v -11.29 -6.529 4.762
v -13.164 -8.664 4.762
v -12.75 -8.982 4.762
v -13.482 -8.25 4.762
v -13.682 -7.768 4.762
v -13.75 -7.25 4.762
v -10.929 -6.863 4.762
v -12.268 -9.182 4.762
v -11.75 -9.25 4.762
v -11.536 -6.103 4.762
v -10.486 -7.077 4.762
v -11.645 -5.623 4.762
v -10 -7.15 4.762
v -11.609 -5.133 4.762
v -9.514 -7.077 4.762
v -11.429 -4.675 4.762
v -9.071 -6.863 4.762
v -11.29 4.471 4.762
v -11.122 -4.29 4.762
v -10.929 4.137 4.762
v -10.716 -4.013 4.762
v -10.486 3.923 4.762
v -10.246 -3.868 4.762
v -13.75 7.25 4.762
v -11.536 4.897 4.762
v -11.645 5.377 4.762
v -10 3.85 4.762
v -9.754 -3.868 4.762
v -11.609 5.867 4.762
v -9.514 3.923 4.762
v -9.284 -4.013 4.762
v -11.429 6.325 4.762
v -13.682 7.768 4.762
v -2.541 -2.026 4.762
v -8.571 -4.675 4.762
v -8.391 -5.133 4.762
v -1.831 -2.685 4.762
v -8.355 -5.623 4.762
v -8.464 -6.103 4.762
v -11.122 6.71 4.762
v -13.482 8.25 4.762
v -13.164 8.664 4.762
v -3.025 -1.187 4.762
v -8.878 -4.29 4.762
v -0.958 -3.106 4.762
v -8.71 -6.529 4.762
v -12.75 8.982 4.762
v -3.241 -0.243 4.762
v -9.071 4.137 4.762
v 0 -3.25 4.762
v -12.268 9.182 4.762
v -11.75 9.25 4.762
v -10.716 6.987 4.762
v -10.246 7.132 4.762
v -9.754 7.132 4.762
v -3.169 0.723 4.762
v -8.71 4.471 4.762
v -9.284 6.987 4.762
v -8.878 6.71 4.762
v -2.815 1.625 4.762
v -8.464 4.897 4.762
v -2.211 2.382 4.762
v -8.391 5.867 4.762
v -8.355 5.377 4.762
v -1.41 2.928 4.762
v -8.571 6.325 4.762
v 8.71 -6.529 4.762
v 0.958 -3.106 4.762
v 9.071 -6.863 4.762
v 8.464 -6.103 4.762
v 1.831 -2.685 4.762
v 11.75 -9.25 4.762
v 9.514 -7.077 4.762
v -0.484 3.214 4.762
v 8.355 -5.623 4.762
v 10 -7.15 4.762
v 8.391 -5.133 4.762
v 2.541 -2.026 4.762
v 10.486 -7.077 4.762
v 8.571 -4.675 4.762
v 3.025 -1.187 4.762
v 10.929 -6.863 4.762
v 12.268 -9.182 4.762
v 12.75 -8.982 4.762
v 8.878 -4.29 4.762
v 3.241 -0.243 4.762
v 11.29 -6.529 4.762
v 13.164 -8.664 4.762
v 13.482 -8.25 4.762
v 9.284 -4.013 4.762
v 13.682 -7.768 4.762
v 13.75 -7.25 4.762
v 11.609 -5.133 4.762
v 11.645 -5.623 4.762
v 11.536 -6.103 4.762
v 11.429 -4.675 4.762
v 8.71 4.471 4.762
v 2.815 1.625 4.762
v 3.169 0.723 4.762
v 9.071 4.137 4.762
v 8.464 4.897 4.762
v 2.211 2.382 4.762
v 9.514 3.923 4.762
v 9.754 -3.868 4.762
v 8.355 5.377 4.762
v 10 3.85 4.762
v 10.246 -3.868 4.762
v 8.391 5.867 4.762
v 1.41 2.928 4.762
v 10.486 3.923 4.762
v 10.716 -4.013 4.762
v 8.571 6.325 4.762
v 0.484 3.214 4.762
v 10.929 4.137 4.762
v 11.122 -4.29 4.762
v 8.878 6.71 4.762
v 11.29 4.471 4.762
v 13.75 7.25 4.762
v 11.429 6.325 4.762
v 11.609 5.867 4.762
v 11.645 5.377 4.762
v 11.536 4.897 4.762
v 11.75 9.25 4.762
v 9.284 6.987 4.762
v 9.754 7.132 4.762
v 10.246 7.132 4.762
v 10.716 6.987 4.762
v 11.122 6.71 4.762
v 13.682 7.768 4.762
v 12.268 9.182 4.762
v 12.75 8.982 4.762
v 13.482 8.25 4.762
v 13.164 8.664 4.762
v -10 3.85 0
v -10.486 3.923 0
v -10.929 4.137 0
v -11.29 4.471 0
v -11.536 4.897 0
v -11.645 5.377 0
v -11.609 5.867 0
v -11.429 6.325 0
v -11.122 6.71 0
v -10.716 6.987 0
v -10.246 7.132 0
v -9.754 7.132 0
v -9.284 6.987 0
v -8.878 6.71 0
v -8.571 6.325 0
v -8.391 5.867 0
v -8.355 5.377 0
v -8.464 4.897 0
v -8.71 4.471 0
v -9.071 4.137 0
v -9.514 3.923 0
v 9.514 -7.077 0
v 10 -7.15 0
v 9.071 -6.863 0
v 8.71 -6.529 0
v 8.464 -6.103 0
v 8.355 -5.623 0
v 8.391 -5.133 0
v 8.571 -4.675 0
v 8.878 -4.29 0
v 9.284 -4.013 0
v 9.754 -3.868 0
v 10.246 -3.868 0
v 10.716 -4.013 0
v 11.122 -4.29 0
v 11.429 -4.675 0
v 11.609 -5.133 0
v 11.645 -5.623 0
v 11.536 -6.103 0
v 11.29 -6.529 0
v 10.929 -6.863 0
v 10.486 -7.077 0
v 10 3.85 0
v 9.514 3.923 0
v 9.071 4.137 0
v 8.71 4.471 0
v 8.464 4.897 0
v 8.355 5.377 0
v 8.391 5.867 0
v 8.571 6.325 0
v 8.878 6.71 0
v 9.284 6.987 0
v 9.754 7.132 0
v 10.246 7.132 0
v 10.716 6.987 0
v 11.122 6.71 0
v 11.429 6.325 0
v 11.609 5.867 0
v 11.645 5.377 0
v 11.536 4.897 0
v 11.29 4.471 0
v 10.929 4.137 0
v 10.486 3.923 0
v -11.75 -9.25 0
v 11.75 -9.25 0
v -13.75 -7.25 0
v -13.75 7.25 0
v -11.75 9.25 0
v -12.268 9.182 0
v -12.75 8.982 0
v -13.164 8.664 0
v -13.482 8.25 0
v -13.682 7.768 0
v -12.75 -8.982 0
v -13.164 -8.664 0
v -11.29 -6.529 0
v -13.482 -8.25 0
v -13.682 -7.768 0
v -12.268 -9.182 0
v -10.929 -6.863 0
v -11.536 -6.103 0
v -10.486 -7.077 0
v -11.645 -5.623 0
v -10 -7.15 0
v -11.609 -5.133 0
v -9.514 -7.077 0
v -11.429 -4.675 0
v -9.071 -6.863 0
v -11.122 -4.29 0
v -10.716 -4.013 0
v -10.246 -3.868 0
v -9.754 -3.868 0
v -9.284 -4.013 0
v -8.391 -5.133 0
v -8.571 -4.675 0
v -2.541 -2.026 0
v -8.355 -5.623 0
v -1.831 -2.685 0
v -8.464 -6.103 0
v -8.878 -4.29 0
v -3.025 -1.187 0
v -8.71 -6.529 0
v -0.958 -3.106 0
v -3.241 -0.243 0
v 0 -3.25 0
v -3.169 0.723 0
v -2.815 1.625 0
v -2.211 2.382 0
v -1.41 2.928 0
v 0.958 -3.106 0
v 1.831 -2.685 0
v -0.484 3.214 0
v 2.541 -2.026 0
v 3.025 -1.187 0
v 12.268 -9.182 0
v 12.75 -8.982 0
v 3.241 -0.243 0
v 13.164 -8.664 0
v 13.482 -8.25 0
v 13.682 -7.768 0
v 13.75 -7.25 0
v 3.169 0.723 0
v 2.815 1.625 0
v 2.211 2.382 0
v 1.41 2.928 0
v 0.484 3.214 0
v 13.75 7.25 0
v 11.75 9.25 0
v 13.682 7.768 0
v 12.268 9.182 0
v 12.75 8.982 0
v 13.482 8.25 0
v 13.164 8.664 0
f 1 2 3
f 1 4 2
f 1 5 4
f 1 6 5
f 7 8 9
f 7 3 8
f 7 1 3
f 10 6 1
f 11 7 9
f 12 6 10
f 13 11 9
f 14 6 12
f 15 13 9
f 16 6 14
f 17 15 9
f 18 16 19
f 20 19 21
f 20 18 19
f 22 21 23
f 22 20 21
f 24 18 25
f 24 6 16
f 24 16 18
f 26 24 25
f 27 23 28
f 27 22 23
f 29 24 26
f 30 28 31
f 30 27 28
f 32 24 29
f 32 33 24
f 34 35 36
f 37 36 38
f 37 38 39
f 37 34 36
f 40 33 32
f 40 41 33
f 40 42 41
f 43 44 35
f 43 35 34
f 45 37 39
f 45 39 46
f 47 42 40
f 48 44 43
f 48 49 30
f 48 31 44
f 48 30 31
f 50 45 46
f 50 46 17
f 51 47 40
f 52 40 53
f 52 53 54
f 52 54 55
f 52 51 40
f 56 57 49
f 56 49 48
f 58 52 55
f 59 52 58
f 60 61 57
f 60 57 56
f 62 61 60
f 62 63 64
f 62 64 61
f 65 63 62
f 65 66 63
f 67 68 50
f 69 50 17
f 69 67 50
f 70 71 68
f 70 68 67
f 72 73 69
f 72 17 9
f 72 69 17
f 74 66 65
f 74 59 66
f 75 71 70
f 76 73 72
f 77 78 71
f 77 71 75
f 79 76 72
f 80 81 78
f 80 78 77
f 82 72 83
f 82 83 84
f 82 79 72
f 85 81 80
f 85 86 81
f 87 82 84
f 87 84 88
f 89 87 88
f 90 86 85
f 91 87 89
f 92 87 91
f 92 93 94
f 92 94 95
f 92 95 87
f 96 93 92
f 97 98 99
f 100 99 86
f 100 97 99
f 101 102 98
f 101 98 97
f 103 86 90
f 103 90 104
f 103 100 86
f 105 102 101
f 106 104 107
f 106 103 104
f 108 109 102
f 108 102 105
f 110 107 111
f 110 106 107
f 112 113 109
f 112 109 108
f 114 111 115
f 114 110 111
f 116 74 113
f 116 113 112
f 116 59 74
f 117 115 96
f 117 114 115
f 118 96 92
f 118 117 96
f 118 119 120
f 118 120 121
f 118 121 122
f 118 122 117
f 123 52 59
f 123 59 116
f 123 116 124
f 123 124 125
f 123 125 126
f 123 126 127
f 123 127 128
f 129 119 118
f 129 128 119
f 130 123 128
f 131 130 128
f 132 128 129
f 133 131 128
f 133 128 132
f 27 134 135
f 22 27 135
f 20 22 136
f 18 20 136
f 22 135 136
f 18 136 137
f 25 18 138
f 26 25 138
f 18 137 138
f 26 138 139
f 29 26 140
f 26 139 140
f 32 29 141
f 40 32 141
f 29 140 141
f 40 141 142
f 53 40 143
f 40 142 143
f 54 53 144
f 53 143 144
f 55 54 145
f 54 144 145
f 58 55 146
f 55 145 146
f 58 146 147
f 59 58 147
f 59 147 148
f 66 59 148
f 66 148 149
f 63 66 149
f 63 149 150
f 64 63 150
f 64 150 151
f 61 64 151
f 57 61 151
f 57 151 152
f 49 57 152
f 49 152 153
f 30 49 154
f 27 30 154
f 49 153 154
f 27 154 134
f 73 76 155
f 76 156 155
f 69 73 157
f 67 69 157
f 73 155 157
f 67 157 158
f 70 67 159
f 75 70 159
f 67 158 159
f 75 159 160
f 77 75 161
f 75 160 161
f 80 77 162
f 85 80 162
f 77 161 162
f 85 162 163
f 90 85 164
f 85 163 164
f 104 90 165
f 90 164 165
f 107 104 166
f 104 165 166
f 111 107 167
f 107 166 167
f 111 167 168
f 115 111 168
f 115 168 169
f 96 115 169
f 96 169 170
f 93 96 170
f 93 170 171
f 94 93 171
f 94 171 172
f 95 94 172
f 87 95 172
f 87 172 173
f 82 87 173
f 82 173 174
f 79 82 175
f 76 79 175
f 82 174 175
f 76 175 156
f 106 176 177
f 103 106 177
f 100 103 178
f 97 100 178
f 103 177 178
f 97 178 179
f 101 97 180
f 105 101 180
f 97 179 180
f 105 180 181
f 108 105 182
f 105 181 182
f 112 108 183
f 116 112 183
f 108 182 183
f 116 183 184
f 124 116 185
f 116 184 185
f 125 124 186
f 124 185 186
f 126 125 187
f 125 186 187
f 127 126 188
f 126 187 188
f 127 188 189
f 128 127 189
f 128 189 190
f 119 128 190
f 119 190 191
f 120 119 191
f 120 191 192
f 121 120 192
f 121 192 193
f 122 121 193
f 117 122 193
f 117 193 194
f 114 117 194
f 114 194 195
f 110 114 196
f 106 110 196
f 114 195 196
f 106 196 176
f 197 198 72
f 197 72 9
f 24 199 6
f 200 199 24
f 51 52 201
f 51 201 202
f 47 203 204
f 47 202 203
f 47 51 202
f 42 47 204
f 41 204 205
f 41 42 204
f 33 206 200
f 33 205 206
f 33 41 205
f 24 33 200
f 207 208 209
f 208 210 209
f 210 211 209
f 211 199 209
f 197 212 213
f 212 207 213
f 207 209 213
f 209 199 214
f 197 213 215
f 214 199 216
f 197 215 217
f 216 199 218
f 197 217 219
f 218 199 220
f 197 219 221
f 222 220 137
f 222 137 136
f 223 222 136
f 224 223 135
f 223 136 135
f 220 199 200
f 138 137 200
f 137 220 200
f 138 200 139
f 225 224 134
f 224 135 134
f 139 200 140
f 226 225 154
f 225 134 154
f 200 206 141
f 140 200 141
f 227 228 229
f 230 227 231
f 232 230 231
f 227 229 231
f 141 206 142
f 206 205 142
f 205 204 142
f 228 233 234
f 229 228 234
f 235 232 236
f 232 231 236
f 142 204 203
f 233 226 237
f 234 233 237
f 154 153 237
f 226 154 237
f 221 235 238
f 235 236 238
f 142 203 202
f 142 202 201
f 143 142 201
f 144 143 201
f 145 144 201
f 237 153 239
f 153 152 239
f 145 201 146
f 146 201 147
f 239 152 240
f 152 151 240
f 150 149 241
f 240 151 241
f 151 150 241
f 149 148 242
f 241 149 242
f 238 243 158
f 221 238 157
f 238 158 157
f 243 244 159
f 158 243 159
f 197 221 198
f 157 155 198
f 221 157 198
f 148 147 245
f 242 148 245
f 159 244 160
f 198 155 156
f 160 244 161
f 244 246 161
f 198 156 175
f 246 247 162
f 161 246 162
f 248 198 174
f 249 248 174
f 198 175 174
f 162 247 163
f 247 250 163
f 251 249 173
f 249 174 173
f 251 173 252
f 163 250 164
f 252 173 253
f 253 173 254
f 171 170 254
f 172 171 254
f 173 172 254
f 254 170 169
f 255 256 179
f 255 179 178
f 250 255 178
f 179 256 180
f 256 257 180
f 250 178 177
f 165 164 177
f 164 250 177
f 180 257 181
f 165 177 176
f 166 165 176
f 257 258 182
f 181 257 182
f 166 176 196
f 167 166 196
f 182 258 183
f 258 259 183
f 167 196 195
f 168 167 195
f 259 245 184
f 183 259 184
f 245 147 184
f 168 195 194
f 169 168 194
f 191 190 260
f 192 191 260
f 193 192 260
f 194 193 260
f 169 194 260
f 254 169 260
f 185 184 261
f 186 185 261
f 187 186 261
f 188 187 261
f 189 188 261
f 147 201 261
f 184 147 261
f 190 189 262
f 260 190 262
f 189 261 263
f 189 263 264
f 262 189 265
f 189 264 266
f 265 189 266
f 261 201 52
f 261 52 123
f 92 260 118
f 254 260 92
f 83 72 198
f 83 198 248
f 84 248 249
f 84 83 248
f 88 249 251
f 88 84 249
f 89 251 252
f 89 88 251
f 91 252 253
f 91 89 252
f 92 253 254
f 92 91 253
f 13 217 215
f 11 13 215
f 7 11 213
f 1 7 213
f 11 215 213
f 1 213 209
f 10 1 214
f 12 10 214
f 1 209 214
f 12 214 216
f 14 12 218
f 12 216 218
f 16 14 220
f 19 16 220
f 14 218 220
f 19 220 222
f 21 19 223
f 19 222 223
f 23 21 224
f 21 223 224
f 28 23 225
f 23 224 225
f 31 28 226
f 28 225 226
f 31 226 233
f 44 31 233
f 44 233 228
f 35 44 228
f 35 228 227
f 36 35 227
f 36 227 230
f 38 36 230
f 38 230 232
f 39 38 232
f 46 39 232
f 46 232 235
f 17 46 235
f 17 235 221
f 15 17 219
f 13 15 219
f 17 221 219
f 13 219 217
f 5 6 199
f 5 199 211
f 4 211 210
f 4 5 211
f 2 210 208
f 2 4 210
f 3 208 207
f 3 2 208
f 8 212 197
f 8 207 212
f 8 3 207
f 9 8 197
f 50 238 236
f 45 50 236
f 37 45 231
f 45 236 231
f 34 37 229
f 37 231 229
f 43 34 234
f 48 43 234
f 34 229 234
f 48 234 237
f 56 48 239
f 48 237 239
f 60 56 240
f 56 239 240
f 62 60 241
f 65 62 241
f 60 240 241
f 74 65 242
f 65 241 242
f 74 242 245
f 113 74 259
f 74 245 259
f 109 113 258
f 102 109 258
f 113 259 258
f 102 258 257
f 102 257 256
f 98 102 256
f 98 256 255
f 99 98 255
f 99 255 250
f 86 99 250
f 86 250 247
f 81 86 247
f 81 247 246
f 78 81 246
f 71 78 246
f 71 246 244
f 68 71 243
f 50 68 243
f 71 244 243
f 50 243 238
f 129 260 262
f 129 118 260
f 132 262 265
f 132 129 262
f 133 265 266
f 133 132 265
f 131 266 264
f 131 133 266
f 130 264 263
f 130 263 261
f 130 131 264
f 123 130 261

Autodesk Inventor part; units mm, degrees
ref_plane "YZ Plane" through (0, 0, 0) normal (1, 0, 0) x (0, 1, 0)
ref_plane "XZ Plane" through (0, 0, 0) normal (0, 1, 0) x (-1, 0, 0)
ref_plane "XY Plane" through (0, 0, 0) normal (0, 0, 1) x (1, 0, 0)
sketch "Sketch1" plane through (0, 0, 0) normal (0, 0, 1) x (1, 0, 0)
  line L0 (13.75, -9.25) -> (-13.75, -9.25)
  line L1 (-13.75, -9.25) -> (-13.75, 9.25)
  line L2 (-13.75, 9.25) -> (13.75, 9.25)
  line L3 (13.75, 9.25) -> (13.75, -9.25)
  line L4 (13.75, -9.25) -> (-13.75, 9.25) construction
  line L5 (-13.75, -9.25) -> (13.75, 9.25) construction
  point P0 (0, 0)
  dimension "d0" = 27.5
  dimension "d1" = 18.5
extrude "Extrusion1" add sketch "Sketch1" along normal blind 4.7625
sketch "Sketch2" plane through (0, 0, 4.7625) normal (0, 0, 1) x (1, 0, 0)
  line L0 (10, -5.5) -> (-10, -5.5) construction
  line L1 (-10, -5.5) -> (-10, 5.5) construction
  line L2 (-10, 5.5) -> (10, 5.5) construction
  line L3 (10, 5.5) -> (10, -5.5) construction
  line L4 (10, -5.5) -> (-10, 5.5) construction
  line L5 (-10, -5.5) -> (10, 5.5) construction
  point P0 (0, 0)
  dimension "d4" = 20
  dimension "d5" = 11
hole "Hole1" at (-10, 5.5, 4.7625) at (10, 5.5, 4.7625) at (10, -5.5, 4.7625) at (-10, -5.5, 4.7625) direction (0, 0, -1) diameter 3.3 end through all
sketch "Sketch3" plane through (0, 0, 4.7625) normal (0, 0, 1) x (1, 0, 0)
  point P0 (0, 0)
hole "Hole2" at (0, 0, 4.7625) direction (0, 0, -1) diameter 6.5 end through all
fillet "Fillet1" radius 2 4 edges at (-13.75, 9.25, 2.3813) (-13.75, -9.25, 2.3813) (13.75, -9.25, 2.3813) (13.75, 9.25, 2.3813)
properties part number "Printhead Belt Retainer Top Spacer" material "Aluminum 6061"
